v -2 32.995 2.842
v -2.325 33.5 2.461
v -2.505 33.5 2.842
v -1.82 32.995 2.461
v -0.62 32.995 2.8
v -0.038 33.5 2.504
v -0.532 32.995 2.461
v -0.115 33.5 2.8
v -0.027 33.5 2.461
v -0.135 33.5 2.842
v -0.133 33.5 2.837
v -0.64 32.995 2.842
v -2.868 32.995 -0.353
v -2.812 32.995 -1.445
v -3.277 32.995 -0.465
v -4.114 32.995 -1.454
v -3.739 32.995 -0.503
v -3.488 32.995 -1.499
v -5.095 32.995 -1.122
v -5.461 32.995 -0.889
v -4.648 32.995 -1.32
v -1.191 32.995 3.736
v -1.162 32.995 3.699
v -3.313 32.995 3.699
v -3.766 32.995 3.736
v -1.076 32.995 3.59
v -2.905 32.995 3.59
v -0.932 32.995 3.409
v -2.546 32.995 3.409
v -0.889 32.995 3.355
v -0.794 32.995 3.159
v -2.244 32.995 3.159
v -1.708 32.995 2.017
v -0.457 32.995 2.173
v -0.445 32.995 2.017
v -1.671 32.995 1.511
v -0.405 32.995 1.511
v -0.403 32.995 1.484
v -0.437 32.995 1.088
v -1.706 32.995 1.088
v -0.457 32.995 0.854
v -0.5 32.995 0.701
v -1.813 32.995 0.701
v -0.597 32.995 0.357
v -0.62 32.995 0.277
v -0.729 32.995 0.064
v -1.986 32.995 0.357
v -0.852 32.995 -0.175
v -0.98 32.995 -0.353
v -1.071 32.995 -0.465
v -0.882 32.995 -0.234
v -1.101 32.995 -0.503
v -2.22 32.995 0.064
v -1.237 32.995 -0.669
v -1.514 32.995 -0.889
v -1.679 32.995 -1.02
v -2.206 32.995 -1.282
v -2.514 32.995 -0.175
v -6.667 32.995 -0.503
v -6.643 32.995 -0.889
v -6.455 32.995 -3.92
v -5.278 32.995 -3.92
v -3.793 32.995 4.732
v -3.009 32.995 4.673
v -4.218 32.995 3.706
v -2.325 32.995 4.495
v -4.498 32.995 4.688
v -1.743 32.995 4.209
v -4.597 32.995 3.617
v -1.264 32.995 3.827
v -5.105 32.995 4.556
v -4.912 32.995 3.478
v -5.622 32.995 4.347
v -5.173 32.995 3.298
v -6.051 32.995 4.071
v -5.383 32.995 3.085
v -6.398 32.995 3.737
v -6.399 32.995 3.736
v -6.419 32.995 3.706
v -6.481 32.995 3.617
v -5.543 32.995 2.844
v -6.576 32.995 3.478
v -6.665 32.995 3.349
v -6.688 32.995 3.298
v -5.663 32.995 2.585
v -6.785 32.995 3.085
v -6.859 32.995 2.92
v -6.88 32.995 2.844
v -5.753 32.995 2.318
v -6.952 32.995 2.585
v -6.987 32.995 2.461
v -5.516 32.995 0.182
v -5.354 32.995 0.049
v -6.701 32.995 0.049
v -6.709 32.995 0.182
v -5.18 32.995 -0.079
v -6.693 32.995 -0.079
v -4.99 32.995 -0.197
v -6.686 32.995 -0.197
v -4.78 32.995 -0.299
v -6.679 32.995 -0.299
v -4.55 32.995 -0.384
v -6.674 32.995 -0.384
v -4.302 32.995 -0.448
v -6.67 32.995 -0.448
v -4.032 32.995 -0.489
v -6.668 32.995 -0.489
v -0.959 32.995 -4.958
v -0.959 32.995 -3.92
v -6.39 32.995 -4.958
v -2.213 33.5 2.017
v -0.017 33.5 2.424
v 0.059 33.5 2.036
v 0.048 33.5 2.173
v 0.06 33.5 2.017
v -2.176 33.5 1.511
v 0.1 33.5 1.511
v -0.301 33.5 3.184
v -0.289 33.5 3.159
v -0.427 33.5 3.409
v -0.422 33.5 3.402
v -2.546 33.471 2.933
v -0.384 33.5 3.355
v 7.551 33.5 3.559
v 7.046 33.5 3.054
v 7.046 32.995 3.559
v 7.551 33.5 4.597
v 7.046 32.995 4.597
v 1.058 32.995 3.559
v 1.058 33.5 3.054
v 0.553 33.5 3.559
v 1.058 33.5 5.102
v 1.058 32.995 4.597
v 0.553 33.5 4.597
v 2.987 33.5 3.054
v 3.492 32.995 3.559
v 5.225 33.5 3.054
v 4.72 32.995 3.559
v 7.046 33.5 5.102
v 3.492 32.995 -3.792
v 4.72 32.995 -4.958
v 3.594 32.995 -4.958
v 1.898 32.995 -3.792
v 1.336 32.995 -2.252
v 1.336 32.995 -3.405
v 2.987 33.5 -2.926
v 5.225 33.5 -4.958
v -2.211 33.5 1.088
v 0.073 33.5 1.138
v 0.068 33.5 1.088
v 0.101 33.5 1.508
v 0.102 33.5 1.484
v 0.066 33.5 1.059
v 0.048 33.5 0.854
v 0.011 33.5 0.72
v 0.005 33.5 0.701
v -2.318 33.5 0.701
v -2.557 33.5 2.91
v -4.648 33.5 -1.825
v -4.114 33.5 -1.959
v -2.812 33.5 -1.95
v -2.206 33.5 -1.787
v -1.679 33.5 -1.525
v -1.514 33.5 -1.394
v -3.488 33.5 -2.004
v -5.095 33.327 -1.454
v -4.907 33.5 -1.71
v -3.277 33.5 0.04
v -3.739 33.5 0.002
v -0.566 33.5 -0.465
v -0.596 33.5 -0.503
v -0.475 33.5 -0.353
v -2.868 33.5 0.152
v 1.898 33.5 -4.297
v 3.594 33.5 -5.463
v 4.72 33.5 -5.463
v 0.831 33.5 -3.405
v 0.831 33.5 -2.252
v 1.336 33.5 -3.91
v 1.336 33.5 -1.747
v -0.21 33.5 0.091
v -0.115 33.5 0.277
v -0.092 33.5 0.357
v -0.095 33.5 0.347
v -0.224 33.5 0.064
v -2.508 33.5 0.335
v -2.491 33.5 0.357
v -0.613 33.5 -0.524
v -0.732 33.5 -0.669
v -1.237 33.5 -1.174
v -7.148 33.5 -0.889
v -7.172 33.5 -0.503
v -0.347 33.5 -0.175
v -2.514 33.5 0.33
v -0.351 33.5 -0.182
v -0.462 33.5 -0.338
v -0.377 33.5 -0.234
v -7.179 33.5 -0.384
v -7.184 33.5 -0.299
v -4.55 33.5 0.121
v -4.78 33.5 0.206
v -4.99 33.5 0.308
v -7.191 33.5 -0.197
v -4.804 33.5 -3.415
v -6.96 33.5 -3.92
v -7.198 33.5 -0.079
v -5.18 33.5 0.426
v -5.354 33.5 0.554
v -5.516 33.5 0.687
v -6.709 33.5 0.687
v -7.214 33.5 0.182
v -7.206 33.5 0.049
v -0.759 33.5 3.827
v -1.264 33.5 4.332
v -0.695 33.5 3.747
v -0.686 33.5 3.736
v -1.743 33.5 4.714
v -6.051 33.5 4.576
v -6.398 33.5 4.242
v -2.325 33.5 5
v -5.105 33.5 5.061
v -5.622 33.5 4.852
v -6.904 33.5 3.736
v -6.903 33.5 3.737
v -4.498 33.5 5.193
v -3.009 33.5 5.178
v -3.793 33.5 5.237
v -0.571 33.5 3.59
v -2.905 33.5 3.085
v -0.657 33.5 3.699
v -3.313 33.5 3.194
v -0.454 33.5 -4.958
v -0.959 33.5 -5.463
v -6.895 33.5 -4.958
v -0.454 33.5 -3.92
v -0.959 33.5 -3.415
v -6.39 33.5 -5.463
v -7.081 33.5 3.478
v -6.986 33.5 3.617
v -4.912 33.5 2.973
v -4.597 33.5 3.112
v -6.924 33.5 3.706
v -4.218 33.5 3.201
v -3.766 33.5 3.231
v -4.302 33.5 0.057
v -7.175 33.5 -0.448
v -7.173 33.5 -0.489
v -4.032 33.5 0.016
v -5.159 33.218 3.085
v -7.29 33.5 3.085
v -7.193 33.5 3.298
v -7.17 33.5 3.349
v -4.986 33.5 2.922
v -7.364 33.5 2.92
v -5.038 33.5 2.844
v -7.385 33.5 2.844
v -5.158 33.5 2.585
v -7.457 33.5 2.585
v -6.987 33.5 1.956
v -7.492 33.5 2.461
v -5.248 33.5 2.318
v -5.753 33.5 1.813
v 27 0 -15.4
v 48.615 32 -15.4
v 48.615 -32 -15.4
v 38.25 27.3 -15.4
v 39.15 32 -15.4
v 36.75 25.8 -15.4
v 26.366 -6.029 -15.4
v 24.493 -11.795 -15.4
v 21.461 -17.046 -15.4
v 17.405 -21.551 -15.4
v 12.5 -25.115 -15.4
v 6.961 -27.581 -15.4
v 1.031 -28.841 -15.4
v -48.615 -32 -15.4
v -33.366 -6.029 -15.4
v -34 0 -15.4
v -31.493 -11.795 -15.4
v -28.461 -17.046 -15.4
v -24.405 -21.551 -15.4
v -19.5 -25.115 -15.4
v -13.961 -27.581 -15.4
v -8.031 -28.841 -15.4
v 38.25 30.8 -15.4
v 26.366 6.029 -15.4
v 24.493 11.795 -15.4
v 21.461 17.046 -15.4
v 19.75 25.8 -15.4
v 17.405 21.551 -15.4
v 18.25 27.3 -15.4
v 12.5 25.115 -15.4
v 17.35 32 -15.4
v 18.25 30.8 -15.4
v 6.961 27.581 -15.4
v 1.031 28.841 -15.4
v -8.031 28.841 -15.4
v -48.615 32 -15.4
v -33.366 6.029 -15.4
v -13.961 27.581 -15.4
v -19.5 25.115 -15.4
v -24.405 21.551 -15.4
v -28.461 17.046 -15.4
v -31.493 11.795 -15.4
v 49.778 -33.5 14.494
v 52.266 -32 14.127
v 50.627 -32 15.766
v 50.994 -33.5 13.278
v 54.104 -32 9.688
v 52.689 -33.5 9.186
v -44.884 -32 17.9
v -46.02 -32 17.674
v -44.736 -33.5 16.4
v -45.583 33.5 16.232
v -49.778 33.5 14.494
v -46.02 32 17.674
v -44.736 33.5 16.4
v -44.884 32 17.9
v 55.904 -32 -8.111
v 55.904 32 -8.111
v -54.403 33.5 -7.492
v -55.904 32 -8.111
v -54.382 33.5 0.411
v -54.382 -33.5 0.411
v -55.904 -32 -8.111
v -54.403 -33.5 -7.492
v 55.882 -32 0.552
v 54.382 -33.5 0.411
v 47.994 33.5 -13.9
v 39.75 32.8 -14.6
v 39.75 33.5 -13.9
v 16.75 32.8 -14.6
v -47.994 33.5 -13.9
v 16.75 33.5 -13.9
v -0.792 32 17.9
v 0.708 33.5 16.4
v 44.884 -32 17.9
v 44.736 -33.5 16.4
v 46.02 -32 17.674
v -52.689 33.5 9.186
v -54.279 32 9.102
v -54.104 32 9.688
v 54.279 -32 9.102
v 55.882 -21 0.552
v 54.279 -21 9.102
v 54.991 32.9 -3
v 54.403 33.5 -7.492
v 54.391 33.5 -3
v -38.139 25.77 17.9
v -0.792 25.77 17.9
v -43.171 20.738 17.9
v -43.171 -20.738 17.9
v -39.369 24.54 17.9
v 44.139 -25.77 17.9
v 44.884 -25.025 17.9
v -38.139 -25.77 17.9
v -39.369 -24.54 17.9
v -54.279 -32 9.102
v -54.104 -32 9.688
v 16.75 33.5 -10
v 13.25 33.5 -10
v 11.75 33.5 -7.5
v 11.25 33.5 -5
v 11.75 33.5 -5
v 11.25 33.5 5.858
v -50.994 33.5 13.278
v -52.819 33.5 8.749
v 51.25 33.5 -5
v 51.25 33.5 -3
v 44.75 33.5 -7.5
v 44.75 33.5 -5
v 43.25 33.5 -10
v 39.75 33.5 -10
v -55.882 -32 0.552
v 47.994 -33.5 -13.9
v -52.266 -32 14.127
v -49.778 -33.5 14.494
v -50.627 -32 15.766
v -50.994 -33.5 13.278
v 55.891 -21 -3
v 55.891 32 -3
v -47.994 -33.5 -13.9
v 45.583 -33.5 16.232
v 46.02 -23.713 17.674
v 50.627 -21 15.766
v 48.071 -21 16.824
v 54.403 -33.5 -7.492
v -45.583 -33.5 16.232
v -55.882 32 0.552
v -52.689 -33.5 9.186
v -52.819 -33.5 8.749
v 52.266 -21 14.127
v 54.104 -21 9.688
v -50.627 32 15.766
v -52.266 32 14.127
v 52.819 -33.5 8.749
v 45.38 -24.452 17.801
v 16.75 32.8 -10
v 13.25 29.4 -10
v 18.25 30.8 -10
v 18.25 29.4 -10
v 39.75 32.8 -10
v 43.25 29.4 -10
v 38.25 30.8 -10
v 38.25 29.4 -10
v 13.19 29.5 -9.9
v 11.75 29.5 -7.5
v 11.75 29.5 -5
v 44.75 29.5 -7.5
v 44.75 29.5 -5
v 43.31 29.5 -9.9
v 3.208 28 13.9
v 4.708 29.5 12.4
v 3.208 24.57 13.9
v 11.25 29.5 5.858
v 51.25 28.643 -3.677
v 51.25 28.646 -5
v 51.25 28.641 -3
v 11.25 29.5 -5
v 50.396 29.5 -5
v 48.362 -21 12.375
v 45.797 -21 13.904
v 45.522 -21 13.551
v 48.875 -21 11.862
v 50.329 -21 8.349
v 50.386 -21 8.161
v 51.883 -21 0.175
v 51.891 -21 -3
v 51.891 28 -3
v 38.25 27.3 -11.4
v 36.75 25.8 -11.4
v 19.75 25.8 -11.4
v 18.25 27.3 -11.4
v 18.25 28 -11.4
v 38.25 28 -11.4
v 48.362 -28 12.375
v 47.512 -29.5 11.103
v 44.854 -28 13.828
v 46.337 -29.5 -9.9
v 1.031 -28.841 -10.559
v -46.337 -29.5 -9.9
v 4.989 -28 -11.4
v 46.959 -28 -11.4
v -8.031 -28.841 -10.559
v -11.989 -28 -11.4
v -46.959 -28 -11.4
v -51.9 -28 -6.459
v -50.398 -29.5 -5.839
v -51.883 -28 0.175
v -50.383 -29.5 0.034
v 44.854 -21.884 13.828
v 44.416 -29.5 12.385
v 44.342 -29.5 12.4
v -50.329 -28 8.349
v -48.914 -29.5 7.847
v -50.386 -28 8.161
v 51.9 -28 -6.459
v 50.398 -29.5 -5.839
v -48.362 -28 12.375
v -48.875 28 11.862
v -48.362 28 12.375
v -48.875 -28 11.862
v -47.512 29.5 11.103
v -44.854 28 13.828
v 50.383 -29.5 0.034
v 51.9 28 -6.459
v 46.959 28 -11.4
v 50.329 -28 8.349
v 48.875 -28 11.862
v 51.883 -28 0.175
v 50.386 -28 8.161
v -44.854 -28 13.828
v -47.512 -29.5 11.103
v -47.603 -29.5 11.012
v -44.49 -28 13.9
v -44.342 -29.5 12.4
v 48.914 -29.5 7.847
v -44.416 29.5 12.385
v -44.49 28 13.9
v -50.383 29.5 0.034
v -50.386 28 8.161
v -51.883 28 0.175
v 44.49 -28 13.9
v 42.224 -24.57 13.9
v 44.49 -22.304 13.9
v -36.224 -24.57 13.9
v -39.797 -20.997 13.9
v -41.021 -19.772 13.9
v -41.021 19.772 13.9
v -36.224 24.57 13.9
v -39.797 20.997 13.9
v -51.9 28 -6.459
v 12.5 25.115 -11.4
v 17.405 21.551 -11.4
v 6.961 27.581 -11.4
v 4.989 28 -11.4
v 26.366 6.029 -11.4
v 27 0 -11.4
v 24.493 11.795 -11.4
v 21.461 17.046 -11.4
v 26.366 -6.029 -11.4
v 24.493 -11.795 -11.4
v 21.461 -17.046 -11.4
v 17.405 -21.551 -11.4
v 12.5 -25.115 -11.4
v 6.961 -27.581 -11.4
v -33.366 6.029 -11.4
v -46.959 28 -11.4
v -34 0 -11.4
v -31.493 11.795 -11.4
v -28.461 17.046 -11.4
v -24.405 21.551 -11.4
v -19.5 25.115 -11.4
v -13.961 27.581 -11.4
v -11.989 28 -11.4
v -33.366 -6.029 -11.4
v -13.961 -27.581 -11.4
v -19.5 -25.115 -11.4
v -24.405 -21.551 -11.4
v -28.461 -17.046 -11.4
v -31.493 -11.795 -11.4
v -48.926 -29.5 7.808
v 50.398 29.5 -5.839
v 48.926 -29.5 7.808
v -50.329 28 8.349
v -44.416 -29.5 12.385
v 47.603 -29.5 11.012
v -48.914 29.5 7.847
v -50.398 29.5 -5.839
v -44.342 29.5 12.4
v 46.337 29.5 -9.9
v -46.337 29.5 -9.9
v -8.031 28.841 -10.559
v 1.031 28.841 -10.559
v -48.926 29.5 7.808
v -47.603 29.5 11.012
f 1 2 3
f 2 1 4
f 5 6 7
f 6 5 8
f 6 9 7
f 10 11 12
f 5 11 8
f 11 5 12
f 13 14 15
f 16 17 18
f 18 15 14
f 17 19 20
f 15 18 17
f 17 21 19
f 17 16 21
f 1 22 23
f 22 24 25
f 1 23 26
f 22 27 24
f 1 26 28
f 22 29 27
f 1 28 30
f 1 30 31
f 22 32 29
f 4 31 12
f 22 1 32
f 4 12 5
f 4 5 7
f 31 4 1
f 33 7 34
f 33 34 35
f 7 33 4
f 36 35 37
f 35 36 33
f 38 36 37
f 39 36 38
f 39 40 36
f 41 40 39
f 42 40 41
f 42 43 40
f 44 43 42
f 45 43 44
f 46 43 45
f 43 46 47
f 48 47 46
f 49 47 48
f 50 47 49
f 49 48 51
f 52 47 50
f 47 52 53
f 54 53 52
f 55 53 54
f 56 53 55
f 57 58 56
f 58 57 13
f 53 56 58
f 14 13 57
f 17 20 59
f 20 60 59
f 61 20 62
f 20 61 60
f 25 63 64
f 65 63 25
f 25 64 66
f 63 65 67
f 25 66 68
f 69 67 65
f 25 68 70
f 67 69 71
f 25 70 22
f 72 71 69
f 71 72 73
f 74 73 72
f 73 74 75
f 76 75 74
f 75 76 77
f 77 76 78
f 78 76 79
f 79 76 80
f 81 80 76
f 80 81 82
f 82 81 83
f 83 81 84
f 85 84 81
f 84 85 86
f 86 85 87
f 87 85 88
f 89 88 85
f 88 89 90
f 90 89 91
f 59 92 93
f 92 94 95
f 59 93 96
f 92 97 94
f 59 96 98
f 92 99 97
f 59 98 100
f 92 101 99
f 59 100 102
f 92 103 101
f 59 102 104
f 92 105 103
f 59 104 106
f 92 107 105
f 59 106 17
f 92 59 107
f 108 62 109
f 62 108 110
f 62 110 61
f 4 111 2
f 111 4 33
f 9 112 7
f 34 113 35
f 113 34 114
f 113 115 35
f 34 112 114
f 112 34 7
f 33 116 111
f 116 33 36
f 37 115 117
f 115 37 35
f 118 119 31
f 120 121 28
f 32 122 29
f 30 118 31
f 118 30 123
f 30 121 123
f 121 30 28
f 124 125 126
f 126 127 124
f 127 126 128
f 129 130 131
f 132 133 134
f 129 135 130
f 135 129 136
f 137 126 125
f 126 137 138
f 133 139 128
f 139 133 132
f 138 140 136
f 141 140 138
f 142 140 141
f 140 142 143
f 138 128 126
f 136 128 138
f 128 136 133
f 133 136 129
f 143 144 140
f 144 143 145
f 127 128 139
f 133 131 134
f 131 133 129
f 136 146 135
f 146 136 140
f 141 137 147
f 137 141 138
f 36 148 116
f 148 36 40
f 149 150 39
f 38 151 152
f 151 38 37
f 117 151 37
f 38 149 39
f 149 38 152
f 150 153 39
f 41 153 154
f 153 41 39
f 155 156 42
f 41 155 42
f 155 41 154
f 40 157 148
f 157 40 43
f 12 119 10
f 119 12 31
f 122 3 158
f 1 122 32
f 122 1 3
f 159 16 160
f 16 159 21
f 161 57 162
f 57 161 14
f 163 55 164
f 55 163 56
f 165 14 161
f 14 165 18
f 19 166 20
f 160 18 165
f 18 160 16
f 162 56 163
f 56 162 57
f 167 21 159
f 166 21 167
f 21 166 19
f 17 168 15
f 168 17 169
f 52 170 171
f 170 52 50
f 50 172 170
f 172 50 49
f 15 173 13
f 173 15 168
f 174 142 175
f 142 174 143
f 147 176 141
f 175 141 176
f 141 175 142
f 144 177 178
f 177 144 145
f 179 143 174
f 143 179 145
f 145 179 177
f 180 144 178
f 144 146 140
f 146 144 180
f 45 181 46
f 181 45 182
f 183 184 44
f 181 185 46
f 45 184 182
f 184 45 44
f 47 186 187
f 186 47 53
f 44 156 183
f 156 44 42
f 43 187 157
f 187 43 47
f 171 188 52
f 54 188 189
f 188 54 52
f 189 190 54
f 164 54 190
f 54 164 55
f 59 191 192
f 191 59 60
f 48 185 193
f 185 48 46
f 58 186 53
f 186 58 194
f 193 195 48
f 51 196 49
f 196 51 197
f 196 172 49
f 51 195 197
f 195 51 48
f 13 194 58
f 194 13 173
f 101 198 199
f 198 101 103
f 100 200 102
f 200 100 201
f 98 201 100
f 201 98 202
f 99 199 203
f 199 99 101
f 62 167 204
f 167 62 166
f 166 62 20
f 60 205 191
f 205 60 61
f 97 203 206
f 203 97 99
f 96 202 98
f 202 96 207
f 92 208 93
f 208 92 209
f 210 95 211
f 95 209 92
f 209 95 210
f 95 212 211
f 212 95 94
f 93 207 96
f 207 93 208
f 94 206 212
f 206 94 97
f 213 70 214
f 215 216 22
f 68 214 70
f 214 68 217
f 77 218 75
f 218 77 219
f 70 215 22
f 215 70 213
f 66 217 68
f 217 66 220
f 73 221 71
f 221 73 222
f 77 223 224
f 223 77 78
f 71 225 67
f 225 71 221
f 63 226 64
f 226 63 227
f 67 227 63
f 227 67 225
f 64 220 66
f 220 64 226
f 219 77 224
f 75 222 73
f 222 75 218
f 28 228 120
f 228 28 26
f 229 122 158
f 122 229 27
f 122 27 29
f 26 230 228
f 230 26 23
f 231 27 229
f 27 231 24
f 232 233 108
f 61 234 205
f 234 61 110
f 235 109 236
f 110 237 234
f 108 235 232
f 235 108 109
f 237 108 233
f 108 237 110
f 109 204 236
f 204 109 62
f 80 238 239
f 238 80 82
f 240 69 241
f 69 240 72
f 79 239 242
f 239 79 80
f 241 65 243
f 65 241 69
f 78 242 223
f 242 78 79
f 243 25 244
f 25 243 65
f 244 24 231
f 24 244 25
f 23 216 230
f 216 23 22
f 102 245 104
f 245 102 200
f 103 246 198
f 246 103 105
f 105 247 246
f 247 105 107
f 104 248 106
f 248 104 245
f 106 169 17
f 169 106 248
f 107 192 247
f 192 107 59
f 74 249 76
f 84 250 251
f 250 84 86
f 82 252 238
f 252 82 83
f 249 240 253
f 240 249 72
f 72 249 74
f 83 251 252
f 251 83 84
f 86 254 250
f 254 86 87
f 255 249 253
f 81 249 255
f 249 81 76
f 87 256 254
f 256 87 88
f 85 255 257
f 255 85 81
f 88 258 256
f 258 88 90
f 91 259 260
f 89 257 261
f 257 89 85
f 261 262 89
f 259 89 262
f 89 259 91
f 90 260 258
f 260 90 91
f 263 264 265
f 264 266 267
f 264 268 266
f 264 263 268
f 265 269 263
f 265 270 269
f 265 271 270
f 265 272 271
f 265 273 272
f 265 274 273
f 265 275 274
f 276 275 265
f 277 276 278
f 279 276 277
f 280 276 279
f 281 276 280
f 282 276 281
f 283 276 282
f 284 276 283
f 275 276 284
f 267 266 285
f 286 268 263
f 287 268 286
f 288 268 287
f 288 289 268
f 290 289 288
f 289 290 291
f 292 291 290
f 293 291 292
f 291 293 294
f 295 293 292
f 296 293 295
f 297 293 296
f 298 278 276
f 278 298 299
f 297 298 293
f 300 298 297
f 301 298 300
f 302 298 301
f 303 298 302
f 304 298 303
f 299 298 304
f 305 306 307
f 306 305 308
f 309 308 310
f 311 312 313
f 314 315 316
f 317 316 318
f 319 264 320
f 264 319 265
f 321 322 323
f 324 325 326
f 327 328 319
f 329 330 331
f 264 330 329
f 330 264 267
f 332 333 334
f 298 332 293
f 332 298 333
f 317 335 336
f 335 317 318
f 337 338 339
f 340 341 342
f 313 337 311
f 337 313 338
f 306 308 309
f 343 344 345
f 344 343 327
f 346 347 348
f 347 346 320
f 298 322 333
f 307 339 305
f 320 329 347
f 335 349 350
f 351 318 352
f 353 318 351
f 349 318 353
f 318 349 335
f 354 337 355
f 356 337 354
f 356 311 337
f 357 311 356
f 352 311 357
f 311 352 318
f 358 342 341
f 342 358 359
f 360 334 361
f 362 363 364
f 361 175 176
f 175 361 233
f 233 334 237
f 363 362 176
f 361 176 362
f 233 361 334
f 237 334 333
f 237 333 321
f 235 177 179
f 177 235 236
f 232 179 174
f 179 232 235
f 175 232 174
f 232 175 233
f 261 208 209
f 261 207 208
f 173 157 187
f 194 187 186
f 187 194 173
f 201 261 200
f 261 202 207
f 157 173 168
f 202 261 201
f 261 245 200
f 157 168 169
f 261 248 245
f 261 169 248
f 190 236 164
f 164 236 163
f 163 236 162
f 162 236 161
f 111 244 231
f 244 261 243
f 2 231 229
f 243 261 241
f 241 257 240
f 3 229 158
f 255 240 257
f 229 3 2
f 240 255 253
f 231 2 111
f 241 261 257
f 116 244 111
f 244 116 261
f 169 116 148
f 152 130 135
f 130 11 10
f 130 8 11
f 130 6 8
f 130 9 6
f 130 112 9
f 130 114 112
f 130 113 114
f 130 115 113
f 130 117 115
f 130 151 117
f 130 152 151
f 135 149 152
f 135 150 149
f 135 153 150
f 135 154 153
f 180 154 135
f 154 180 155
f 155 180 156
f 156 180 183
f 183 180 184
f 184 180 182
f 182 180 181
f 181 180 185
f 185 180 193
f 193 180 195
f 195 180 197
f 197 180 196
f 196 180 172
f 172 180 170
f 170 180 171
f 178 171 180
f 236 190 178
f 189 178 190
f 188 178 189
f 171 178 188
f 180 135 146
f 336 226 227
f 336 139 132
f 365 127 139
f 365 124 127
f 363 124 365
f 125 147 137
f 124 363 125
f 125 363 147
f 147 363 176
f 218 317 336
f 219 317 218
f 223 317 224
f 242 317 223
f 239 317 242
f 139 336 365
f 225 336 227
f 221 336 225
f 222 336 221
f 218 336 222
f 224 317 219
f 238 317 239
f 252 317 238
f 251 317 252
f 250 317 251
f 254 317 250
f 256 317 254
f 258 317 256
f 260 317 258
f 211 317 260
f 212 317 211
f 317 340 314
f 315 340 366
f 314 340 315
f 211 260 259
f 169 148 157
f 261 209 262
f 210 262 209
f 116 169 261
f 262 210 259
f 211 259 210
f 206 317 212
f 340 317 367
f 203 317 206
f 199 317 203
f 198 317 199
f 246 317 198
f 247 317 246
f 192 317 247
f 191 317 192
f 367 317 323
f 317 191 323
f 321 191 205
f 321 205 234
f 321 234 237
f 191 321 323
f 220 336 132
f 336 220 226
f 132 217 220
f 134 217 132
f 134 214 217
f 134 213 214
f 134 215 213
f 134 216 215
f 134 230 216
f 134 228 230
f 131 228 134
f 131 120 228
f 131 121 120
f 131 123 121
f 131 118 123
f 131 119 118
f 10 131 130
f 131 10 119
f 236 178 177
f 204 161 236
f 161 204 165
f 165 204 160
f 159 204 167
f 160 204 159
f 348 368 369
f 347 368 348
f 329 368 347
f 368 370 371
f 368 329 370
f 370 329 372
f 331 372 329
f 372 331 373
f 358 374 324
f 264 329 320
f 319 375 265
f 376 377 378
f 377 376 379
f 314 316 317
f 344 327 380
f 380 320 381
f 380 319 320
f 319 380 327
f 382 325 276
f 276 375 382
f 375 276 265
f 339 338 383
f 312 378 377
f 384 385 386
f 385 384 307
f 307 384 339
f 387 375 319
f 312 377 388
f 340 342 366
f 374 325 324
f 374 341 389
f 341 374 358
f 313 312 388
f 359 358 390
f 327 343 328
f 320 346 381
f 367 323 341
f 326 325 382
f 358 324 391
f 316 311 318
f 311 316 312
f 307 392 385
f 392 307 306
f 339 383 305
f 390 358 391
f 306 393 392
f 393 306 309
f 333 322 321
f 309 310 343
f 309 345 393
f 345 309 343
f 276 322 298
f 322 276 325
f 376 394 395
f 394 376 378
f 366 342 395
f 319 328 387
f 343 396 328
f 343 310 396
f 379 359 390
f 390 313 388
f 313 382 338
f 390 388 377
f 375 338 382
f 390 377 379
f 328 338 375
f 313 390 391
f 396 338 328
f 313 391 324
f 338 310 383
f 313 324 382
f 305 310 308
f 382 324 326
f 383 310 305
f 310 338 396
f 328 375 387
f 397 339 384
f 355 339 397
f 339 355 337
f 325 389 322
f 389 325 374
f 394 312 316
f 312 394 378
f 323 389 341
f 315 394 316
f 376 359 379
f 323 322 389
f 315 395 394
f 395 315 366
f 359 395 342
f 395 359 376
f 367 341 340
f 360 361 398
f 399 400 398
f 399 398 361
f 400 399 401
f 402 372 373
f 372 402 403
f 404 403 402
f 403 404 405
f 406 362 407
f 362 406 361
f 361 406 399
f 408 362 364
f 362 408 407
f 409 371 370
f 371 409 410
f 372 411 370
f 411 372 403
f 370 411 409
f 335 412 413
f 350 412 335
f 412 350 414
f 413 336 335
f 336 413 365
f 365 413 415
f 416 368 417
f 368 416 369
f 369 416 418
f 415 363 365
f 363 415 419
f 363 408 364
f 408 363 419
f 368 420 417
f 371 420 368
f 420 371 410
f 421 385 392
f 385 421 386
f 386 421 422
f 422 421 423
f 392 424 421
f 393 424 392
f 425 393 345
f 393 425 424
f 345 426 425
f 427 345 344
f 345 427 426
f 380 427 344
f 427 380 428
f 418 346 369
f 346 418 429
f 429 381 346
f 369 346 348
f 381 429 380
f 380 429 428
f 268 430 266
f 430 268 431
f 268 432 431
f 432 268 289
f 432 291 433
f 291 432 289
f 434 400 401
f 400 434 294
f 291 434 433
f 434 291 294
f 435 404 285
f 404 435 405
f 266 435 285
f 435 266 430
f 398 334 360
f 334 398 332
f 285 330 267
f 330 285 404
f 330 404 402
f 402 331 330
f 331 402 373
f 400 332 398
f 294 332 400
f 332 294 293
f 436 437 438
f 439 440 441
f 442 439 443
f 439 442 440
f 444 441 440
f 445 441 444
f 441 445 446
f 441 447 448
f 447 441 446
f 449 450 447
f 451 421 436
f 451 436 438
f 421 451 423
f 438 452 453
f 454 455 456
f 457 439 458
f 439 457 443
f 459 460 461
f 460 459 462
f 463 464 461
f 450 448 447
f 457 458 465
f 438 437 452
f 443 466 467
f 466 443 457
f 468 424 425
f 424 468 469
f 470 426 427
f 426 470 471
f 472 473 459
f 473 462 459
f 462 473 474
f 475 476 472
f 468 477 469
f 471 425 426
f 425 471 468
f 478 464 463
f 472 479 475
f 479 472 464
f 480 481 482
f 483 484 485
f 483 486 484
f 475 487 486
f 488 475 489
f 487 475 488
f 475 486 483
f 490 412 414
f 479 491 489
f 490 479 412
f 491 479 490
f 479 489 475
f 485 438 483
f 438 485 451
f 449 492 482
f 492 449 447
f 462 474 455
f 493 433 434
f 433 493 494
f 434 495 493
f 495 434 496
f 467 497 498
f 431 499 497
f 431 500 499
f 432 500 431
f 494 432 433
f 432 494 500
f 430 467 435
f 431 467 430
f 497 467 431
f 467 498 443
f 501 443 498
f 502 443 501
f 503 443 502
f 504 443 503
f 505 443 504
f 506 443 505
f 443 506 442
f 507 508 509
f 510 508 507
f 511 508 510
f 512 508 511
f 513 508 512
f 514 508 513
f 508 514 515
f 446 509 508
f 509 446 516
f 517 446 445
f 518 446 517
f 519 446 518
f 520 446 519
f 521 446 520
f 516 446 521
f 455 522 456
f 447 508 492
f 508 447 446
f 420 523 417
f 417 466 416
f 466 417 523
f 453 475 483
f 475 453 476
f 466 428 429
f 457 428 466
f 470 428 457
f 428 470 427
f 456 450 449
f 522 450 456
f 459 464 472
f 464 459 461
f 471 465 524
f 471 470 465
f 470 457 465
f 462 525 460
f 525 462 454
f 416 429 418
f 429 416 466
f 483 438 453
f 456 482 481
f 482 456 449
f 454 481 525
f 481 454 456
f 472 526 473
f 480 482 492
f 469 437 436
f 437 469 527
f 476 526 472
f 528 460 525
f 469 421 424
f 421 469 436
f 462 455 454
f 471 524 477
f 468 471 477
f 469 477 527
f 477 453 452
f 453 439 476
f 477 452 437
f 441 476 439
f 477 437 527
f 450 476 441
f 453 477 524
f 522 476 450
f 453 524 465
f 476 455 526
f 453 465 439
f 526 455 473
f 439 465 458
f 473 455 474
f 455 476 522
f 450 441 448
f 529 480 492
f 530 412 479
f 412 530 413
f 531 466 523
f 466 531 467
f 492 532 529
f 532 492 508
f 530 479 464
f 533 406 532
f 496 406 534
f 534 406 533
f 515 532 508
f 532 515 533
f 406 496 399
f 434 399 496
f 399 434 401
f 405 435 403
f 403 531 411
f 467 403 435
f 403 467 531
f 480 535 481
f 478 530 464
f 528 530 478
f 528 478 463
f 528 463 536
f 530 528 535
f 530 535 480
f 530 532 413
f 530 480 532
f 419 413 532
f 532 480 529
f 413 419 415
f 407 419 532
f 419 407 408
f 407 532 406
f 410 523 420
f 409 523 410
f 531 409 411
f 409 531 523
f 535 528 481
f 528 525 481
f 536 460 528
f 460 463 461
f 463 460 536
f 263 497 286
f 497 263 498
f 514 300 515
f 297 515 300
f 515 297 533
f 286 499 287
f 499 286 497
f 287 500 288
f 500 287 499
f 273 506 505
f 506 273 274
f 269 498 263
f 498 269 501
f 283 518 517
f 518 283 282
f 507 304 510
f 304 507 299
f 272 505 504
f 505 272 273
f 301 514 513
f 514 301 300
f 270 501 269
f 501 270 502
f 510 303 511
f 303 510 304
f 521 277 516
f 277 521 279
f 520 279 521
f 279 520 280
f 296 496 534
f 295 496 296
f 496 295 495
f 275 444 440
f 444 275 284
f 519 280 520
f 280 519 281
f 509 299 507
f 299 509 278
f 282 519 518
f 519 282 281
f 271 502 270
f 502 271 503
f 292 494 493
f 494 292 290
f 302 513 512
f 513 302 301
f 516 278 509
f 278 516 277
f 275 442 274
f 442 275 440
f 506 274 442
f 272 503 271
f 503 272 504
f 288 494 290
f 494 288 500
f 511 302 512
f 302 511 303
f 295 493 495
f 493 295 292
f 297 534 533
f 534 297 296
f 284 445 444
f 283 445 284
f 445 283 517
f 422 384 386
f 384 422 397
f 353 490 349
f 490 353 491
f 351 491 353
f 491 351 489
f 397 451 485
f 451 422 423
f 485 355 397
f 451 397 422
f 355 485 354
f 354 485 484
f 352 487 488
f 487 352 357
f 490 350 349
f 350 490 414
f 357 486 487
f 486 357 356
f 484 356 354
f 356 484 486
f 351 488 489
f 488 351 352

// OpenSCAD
// file: polyround2019.scad
//p=mirrorPolyline([[-1,-4,11,4],[-10,0,14,4],[-12,20,20,4],[-20,50,40,4],[-20,80,40,4],[-20,110,30,4],[-10,100,0,4],[-10,0,0,5],[-20,5,5,4],[-20,5,16,2],[-10,4,12,4] ]);

//polyline(p);
// 
//
// color ("yellow")polyline (polyRound(let(ip=([for (i=[0:3])[rnd(0,30),rnd(0,100),rnd(0,30),2+rnd(2)] ]))
//     mirrorPolyline([for(i=[0:0.5:len(ip)-1]) i==floor(i)?ip[i]: ip[i]+
//     [
// floor(rnd(2))==0? 0:max(0,rnd(10,20)*sign(rnd(-1,1))),
// floor(rnd(6))==0? 0:rnd(10,20)*sign(rnd(-1,1)),
// floor(rnd(2))==0? 0.01:rnd(10,20)*sign(rnd(-1,1)),
// 0(0,30),2+rnd(2)] ]))
//     mirrorPolyline([for(i=[0:0.5:len(ip)-1]) i==floor(i)?ip[i]: ip[i]+
//     [
// floor(rnd(2))==0? 0:max(0,rnd(10,20)*sign(rnd(-1,1))),
// floor(rnd(6))==0? 0:rnd(10,20)*sign(rnd(-1,1)),
// floor(rnd(2))==0? 0.01:rnd(10,20)*sign(rnd(-1,1)),
// 0
// ]  ])) ,2.5);
// ]  ])) ,1.5);
// 
// color ("darkgrey")polyline (polyRound(let(ip=([for (i=[0:2])[rnd(0,30),rnd(0,100),rnd


function polyRound(radiipoints,fn=5)=
// reworte most of it all here heavily use of wrap function
let(p=getpoints(radiipoints)) 
let(r=getradii(radiipoints))
let(Lp1=last(p),Lp=Lp1+1) 
let(
temp=[for(i=[0:last(p)]) 
round3points(
[ p[wrap(i-1,Lp,0)], p[wrap(i  ,Lp,0)], p[wrap(i+1,Lp,0)]],
r[i],
fn)])   //common trick  to flatten a list of list
[for (a = temp )        for (b = a) b];






 
 


function round3points(v,r,fn=6)=let(
p0=v[0],p1=v[1],p2=v[2],
n01=un(p0-p1),
n21=un(p2-p1),
planeNormal=un(cross(n21,n01)),
 

midLineNormal=un(n01 +n21),
 
angle=angle(n21,n01),
tanD=r /sin(angle/2),
 
center=p1+  midLineNormal*( tanD)
 

)
concat(
 [ for(i=[-.5:1/fn:.5])
    
center+ rotateAxis(   -midLineNormal*r ,planeNormal,(-i)*angle +180*i )    
] );

 
function angle (a,b)=atan2(sqrt((cross(a,b)*cross(a,b))),(a* b));
function dot(v1,v2) = v1[0]* v2[0]+ v1[1]* v2[1]+ v1[2]* v2[2];
function dot4(v1,v2) = v1[0]* v2[0]+ v1[1]* v2[1]+ v1[2]* v2[2]+ v1[3]* v2[3];

function point2plane(p,o,n) =
let (v = o - p) p + (n * (v.x * n.x + v.y * n.y + v.z * n.z)); //proj ap to a plane
function dist_point2plane(p,o,n) =
let (v = p-o) ( (v.x * n.x + v.y * n.y + v.z * n.z)); //proj ap to a plane
function mirrorPolyline(v)= [each v, each rev([for (i=v)[-i.x,i.y,i.z,i[3]]])] ;

function v3(p) = [p.x,p.y,p.z]; // vec3 formatter
function rev(v) = [for (i = [len(v) - 1: -1: 0]) v[i]];
function avrg(l) = len(l) > 1 ? addl(l) / (len(l)) : l;
function avrgp(l) = len(l) > 1 ? addlp(l) / (len(l)) : l;
function addlp(v,i=0,r=[0,0,0]) = i<len(v) ? addlp(v,i+1,r+v[i]) : r;
function lerp(start,end,bias) = (end * bias + start * (1 - bias));
function un(v)=assert (is_list(v)) v/max(norm(v),1e-64) ;
function rndc(a = 1,b = 0,s = [])=[rnd(a,b,s),rnd(a,b,s),rnd(a,b,s)];
function rnd(a = 1,b = 0,s = []) =
s == []?(rands(min(a,b),max(a,b),1)[0]) :(rands(min(a,b),max(a,b),1,s)[0]);
function getpoints(p)=[for(i=p)[i.x,i.y,i.z]];// gets [x,y]list of[x,y,r]list
function getradii(p)= [for(i=p)is_num(i[3])? i[3]: 0 ]; // gets [r]list of[x,y,r]list
function wrap(x,x_max=1,x_min=0) = (((x - x_min) % (x_max - x_min)) + (x_max - x_min)) % (x_max - x_min) + x_min; // wraps numbers inside boundaries
function last(i)=len(i)-1;// shorthand sugar for len(i)-1

module polyline(p,r=1) {for(i=[0:max(0,len(p)-2)])line(p[i],p[wrap(i+1,len(p) )],r);}

module polyline_open(p,r=1) {
     if (len(p)-1>1)
     for(i=[0:max(0,len(p)-2)])line(p[i],p[   i+1],r);
} // polyline plotter

module line(p1,p2 ,width=1) 
{ // single line plotter
hull() {
translate(v3(p1)) sphere(width);
translate(v3(p2)) sphere(width);
}
}

module 3dcircle(r,n)
{
axis=cross([0,0,1],n);
theta=angle ([0,0,1],n);
rotate (theta,axis) circle(r);
}


 function rotateAxis(point,axis,angle)=RotateQuat(BuildQuat(axis,angle), point);

function  /*vec4*/  NormQuat(/*vec4*/q)=
 let(     lenSQ =  dot4(q, q),     invLenSQ = 1./lenSQ)     q*invLenSQ;
 

function /*vec4*/ BuildQuat(/*vec3*/  axis,   angle)= 
     NormQuat(concat(axis *sin(angle*0.5),[ cos(angle*0.5)]));


 function /*vec3*/RotateQuat(/*vec4*/q, /*vec3*/v)=
let(    /*vec3*/ t = 2.*cross([q.x,q.y,q.z], v)     )    v + q[3]*t + cross([q.x,q.y,q.z], t);




//
// function /*vec4*/MulQuat(/*vec4*/q1, /*vec4*/q2)=
//{
//    /*vec4*/res = vec4(0.);
//    res.w   = q1.w*q2.w - dot(q1.xyz, q2.xyz);
//    res.xyz = q1.w*q2.xyz + q2.w*q1.xyz + cross(q1.xyz, q2.xyz);
//     NormQuat(res);
//}
//
// 
//    
//
//
function fromTo(/*vec3*/p,/*vec3*/q)=
 
 acos(dot(p,q));

 
// function /*vec4*/quatLookAt(/*vec3*/forward,/*vec3*/up){
//    forward=normalize(forward);
//    up=normalize(up);
//  (BuildQuat(cross(forward,up),fromTo(forward,up)));
//}
//
//
// function /*vec4*/quatInv(in /*vec4*/q)=
//{
//     vec4(-q.xyz, q.w);
//}
// main file
    include<polyround2019.scad>
    nr="51";
cage=false;
//cage=true;
c1=17.5/2+1;
c2=4+1;
c3=59;
hc3=58/2;
l1=102/2-c1;
l2=102/2-c2*1.5+1;
l3=(24-c1*2)+c2-1.5;
fxtra=0;
shell=4;
wl1=l1+c1*1;
wl3=l3+c2/2+1;
wl3f=l3+c2/2+1+fxtra;
whc3=hc3+1.5;
r=4;
r2=10;

slit =false;
     path=  polyRound( [
     [ wl1-10,wl3f,whc3,3],
    [ wl1,wl3f,whc3,3], 
   [ wl1,wl3f,-whc3,r],  [wl1,-wl3,-whc3,r2], [-wl1,-wl3,-whc3,r2],
     [-wl1,wl3f,-whc3,r],[-wl1,wl3f,whc3,r],  
      [-wl1,-wl3,whc3,r2], 
     [ wl1-47,-wl3,whc3,r2], 
     [ wl1-47,wl3f,whc3,3], 
//     [ wl1-35,wl3f,whc3,3],   
//     [ wl1-35,wl3f,whc3-10,3],   
      
    ]
  ,fn=4);
  
  
       path2=   ( [
       [0, 0, 30], [0, 20, 30], 
       [21.2132, 20, 21.2132]       ,[21.2132, 0, 21.2132]       ,
       [30, 0, 0],    [30, 20, 0], 
       [21.2132, 20, -21.2132],        [21.2132, 0, -21.2132], 
       [0, 0, -30],   [0, 20, -30],
       [-21.2132, 20, -21.2132],  [-21.2132, 0, -21.2132], 
       [-30, 0, 0],[-30, 20, 0],
       [-21.2132, 20, 21.2132],        [-21.2132, 0, 21.2132], 
      [0, 00, 30], 
       
       ]*1.03
       
   );
//       echo(path2);
//*difference(){
//    union(){
//translate([0,-29,0])    rotate([0,90/4+0,0]) translate([0,l2 ,0])    polyline(path2,4);
//translate([0,10.5,0])rotate([-90,0,0])cylinder(8,hc3+6,hc3+6);
//    }
//translate([0,0,0])rotate([-90,0,0])cylinder(60,hc3,hc3);
//
//}+965
rotate([-90,0,0])difference(){
union(){
difference(){

    //main boudy
hull(){
    linear_extrudeSH(c3+shell*2, $convexity=100,center=true) offset(delta=shell,$fn=1)topprofile();
//  translate([0,fxtra,0])  linear_extrudeSH(c3+shell*2, $convexity=100,center=true) offset(shell,$fn=1)topprofile();
    }
    
    
   minkowski(){
    translate([0,0,hc3+shell])linear_extrude(0.01,center=true)    text(nr,$fn=4,halign="center",valign="center");
 
     cylinder(shell,0,shell,$fn=4);
     }
    
    
    
  
 translate([l1-18+5,-10,hc3+shell-2])hull(){
   // top notch1
       cube([30,40,shell*3.6-3+3],center=true);
    translate([0,0,0])// top notch1
       cube([33,35,shell*3.6-3+3],center=true);
    translate([0,0,0])// top notch1
       cube([30,40,shell*3.6-3+19],center=true);}
    
   translate([l1-25,-15,hc3+shell]) rotate([0,0,45]) cube([40,20,80],center=true);// chamfer
    translate([l1-10,-15,hc3+shell]) rotate([0,0,0]) cube([40,40,26],center=true);// chamfer
   translate([l1-10,-15,hc3+shell]) rotate([0,0,0]) cube([40,40,26],center=true);// chamfer
  translate([l1+10,-8,hc3+shell+-10]) rotate([0,0,0]) cube([25,22,88],center=true);// chamfer
  * translate([l1+10,22, -10]) rotate([0,0,0]) cube([50,40,1],center=true);// chamfer
    translate([l1+5,-8,hc3+shell]) rotate([0,0,0]) cylinder(10,10,10,center=true);// chamfer
}
        
//translate([0,0,0])hull()
//{
//        linear_extrudeSH(c3+shell*2, $convexity=100,center=true) offset(shell)topprofile();
//
// translate([-20,0,0])rotate([-90,0,0])cylinder(21,hc3+2.5,hc3+2.5);
//translate([20,0,0])rotate([-90,0,0])cylinder(21,hc3+2.5,hc3+2.5);
//     translate([-20,0,0])rotate([-90,0,0])cylinder(22,hc3+1,hc3+1);
//translate([20,0,0])rotate([-90,0,0])cylinder(22,hc3+1,hc3+1);
//}
if(cage)translate([0,-c2+2 ,0 ])polyline(path,4.1);
}


   translate([l1-13 ,0,hc3+shell])// top notch
hull(){
    cube([20-3,40-3,shell*3.6],center=true);
   cube([20,40,shell*3.6-3],center=true);
}   
translate([l1-13 ,0,hc3+shell+shell*1.25])// top notch
 hull(){
    cube([23-3,43-4,shell*3.6],center=true);
   cube([23,43,shell*3.6-4],center=true);
}

 //innner void   
linear_extrudeSH(c3, $convexity=100,center=true) topprofile();
*translate([0,0,-hc3])linear_extrudeSH(shell*34, $convexity=100,center=true) offset(7)offset(-10)scale([.5,1])topprofile();


if(slit)translate([-90,-.5,-hc3+1])linear_extrudeSH(2, $convexity=100 ) topprofile();// slit
//mirror([0,0,1])translate([-90,-4,-hc3+1])linear_extrudeSH(2, $convexity=100 ) topprofile();

 
//union( convexity=100){
//linear_extrude(2, $convexity=100) offset(3)  topprofile();
//translate([0,0,c3*2+3])linear_extrude(2, $convexity=20) offset(3)  topprofile();
//linear_extrude(c3*2+4, convexity=100)
//
//difference()
//{
// offset(2)   topprofile();
//    topprofile();
//}
//}

    
    
translate([0,0,0])hull()
{
 translate([-5,0,0])rotate([-90,0,0])cylinder(25,hc3,hc3);
translate([-2,0,0])rotate([-90,0,0])cylinder(25,hc3,hc3);
}

 // screen port
translate([3,-16,0]) difference(){
 rotate([90,0,0])  linear_extrude(8,center=true,convexity=10,scale=1.1) 
    offset(delta=shell*2,chamfer=true) offset(-shell*2)square([86,48],center=true);// display
//  translate([-0,-0,29])     cube([100,15,2.5],center=true);// display
// translate([-0,-0,-29])     cube([100,15,2.5],center=true);// display

}


//translate([l1-8,-10,hc3+shell])// top notch
//hull(){
//    cube([42-3,40-3,shell*3.6],center=true);
//   cube([42,40,shell*3.6-3],center=true);
//}
 *translate([l1,-15,hc3+shell])  cube([40,40,40],center=true);
 *translate([l1,-15,-10])  cube([40,30,8],center=true);
 *translate([l1,-13,-10]) rotate([45,0,0]) cube([40,11,11],center=true);
 *if(!cage) translate([l1-35,-13,hc3]) rotate([0,0,45]) cube([40,10,10],center=true);
 *if(!cage) translate([l1+c1,-2,hc3]) rotate([0,0,45]) cube([40,10,36],center=true);
 *translate([l1,-3-20,hc3+shell-20]) rotate([-45,0,0]) cube([40,20,40],center=true);// chamfer


}
function clamp(v,a=0,b=1)=min(max(v,min(a,b)),max(1,b));


module topprofile(){
    offset(-.1,$fn=1)hull(){
     offset(1,$fn=1)
hull(){
translate([l1,0])  circle(c1,$fn=8);
translate([-l1,0])  circle(c1,$fn=8);
 

translate([c2*.25*0,-l3])
 {
translate([l2,0])  circle(c2,$fn=8);
translate([-l2,0])  circle(c2,$fn=8);
}




} 
translate([0,c2+1.5]) 
 {
translate([l2+c2/2,0])  circle(c2,$fn=4);
translate([-l2-c2/2,0])  circle(c2,$fn=4);
}
}
}

module linear_extrudeSH(h,convexity=100,center )
{
    sh=1.5;
    hull(){
    linear_extrude(h-2*sh, $convexity=convexity,center=center) children();
    linear_extrude(h , $convexity=convexity,center=center) offset(r=-1*sh  )children();

    }
    }
